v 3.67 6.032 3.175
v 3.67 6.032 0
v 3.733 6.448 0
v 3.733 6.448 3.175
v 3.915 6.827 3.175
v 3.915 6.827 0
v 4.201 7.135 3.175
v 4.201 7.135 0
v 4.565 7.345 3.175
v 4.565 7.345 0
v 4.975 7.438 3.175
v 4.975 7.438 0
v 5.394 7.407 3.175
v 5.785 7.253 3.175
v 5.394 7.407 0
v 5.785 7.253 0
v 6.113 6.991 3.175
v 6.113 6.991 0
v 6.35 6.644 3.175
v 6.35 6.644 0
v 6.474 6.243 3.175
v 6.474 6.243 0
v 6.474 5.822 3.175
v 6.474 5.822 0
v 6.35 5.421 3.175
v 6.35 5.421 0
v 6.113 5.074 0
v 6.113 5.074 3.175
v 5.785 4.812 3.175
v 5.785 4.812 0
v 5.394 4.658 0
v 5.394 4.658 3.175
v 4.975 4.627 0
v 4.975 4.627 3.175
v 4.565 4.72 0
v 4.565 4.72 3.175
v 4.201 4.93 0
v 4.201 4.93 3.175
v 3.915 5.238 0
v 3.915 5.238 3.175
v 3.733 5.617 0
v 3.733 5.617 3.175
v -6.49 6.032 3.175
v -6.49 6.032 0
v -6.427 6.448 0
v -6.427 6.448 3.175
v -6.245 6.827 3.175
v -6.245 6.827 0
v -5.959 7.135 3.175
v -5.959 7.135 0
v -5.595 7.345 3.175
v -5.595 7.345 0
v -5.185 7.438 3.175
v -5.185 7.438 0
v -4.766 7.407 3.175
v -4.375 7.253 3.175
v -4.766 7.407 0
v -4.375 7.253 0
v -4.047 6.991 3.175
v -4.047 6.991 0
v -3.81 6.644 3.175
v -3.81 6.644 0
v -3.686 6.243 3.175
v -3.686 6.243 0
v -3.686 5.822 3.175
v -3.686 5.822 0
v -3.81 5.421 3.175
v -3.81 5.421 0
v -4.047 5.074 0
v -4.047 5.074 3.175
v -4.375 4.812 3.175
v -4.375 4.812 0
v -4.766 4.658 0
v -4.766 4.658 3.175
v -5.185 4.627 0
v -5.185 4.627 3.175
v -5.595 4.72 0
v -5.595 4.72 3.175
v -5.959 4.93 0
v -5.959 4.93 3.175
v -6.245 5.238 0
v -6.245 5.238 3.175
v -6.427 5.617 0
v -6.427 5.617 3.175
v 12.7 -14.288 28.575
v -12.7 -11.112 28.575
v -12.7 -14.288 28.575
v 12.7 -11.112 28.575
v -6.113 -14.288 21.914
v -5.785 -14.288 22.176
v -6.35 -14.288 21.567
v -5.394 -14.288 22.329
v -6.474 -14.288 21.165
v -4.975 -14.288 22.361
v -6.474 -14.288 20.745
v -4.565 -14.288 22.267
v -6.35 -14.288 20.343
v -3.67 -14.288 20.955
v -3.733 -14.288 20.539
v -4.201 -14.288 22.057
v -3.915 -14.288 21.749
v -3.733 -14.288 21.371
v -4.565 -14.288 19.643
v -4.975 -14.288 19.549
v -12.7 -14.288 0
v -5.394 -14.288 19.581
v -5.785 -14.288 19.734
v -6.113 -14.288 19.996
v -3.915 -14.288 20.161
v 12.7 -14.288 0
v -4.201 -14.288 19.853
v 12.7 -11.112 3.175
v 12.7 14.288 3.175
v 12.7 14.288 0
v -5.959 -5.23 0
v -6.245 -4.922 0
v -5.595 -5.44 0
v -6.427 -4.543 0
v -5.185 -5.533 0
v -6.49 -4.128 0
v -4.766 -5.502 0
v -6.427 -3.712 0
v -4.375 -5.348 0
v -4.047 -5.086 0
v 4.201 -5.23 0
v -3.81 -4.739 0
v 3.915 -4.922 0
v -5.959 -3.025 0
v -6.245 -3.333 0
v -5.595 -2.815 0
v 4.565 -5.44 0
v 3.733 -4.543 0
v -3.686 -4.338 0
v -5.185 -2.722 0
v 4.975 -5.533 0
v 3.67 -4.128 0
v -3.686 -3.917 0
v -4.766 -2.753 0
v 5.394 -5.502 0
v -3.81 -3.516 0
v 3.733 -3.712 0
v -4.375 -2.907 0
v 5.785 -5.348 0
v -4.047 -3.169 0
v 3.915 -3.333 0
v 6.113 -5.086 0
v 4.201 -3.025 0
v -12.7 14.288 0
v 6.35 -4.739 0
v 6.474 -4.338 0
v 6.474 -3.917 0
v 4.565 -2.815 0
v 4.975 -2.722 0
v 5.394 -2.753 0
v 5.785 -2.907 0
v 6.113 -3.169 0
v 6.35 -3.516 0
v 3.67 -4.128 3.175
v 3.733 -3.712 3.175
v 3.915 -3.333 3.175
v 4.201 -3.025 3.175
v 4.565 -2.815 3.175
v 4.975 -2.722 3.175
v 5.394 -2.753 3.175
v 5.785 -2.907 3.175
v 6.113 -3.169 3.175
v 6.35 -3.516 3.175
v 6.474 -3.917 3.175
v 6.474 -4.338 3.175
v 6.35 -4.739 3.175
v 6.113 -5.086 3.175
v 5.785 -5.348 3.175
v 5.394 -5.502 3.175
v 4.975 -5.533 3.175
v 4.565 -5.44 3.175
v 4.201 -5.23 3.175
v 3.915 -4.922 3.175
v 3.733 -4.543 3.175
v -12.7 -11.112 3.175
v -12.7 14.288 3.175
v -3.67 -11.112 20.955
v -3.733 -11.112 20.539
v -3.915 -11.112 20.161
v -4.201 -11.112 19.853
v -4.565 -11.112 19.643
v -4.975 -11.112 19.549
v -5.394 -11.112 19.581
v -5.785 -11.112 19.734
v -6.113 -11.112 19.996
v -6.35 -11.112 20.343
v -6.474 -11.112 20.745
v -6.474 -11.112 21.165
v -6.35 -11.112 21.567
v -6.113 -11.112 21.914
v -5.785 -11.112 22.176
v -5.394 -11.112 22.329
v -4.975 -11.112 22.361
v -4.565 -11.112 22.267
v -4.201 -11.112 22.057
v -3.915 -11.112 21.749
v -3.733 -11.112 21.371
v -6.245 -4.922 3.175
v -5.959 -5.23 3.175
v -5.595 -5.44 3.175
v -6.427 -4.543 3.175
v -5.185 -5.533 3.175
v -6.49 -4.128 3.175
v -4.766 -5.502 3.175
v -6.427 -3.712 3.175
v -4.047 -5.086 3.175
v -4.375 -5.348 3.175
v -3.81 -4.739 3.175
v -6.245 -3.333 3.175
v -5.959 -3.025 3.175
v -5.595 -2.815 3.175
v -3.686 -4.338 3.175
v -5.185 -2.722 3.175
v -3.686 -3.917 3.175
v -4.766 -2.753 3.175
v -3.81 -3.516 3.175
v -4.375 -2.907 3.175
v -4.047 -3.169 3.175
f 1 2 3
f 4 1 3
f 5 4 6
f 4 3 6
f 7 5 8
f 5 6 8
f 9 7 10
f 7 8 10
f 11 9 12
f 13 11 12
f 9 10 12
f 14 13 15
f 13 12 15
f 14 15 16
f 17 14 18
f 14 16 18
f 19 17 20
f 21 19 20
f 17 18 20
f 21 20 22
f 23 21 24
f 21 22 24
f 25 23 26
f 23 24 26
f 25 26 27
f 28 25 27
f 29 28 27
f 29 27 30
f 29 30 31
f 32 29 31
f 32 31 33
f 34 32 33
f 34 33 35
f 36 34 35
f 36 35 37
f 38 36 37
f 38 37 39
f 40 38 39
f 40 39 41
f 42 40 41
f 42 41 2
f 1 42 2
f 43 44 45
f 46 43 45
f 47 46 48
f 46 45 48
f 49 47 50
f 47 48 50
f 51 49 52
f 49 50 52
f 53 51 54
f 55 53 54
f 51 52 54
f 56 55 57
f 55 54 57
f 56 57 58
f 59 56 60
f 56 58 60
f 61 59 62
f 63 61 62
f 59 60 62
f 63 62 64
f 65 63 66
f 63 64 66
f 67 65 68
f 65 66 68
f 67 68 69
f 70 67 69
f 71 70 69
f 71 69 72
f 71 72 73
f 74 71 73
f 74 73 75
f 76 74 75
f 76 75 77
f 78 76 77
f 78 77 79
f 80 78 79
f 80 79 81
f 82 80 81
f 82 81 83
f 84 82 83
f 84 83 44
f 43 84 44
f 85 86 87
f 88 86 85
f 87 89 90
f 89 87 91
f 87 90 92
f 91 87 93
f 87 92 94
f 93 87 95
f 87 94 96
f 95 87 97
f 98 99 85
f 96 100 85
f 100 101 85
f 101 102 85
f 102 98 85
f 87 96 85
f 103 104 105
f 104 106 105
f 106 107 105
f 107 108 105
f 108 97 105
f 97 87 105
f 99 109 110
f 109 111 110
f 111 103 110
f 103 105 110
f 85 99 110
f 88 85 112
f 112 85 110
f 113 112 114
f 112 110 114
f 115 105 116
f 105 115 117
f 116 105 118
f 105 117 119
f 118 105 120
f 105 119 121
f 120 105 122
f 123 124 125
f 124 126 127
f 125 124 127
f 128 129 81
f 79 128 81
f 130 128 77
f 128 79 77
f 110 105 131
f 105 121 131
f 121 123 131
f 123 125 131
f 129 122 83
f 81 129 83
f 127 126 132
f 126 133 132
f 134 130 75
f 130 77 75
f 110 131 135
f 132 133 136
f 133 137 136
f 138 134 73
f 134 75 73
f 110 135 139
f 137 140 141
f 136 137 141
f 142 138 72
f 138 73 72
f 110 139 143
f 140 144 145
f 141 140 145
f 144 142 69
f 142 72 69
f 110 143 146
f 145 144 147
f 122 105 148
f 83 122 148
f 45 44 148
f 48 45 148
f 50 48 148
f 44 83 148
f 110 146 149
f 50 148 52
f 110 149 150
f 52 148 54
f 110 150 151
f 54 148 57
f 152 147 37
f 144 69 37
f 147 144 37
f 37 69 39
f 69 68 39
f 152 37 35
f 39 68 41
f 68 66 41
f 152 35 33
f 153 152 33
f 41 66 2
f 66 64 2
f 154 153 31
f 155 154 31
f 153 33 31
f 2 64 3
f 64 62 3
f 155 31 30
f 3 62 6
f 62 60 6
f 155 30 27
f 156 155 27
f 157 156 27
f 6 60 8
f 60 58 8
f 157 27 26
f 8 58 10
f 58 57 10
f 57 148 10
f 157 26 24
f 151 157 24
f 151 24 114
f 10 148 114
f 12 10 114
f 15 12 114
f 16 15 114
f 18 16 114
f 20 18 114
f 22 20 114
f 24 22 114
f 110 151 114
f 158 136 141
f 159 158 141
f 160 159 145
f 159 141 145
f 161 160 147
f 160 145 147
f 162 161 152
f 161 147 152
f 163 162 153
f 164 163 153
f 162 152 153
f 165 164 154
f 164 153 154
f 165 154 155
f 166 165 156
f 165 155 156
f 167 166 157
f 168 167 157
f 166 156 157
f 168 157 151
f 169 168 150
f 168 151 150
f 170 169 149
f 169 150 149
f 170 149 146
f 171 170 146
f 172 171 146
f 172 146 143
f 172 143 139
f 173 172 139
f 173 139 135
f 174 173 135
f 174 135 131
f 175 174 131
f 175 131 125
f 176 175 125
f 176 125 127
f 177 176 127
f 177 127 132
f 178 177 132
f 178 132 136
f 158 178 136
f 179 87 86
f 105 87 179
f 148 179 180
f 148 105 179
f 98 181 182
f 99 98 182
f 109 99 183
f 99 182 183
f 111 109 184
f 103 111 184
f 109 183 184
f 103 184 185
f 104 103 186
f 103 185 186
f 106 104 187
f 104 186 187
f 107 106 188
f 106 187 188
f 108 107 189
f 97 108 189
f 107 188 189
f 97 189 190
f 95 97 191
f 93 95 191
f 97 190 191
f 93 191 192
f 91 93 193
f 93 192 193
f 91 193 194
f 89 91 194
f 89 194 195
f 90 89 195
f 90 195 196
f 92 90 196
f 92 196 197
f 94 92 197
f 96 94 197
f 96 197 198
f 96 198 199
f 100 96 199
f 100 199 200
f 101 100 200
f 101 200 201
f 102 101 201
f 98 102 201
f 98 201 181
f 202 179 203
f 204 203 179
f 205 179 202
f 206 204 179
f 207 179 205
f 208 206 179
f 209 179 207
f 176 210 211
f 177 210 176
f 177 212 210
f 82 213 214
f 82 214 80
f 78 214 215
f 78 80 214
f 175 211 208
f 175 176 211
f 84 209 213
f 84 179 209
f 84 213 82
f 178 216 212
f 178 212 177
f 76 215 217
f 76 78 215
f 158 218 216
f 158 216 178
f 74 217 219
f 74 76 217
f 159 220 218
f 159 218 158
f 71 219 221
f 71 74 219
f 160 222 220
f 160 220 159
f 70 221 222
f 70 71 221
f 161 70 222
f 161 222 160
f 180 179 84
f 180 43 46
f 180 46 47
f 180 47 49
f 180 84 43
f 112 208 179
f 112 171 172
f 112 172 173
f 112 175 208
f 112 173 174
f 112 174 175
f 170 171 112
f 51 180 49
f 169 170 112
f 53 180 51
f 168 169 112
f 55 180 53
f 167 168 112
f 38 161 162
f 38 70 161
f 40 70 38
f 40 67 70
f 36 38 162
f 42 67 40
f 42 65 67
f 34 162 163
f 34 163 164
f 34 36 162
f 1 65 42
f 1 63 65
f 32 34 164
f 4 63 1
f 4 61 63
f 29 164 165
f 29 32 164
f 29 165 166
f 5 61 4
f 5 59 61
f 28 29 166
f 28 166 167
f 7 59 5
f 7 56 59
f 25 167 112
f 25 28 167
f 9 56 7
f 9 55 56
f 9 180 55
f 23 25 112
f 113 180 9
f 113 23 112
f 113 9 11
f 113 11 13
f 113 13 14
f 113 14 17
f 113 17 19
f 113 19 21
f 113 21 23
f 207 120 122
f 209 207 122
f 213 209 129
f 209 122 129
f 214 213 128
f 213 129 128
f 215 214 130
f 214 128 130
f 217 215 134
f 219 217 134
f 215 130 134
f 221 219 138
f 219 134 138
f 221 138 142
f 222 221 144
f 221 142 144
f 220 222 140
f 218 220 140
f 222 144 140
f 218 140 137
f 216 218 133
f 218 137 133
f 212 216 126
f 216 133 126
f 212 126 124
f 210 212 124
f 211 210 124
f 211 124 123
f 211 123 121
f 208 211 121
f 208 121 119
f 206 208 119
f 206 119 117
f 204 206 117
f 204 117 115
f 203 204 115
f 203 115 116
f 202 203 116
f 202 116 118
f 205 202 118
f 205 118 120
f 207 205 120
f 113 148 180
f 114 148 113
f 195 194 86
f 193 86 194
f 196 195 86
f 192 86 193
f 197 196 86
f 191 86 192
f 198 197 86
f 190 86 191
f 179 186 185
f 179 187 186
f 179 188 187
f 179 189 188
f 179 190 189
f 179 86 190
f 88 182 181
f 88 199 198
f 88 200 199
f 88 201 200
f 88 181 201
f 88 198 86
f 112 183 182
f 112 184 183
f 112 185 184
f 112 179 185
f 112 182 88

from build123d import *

# Parameters (mm, degrees)
SKETCH1_W            = 25.4
SKETCH1_H            = 28.575
BOSS_EXTRUDE1_DEPTH  = 3.175
SKETCH2_W            = 25.4
SKETCH2_H            = 3.175
BOSS_EXTRUDE2_DEPTH  = 25.4
SKETCH4_R            = 1.4097
CUT_EXTRUDE1_DEPTH   = 29.575
LPATTERN1_COUNT      = 2
LPATTERN1_PITCH      = 10.16
LPATTERN1_COUNT_DIR2 = 2
LPATTERN1_PITCH_DIR2 = 10.16
SKETCH5_R            = 1.4097
CUT_EXTRUDE2_DEPTH   = 4.175


with BuildPart() as part:
    # Sketch1 → Boss-Extrude1 (new body)
    with BuildSketch(Plane.XY):
        Rectangle(SKETCH1_W, SKETCH1_H)
    extrude(amount=BOSS_EXTRUDE1_DEPTH)

    # Sketch2 → Boss-Extrude2 (add)
    with BuildSketch(Plane.XY.offset(3.175)):
        with Locations((0, -12.7)):
            Rectangle(SKETCH2_W, SKETCH2_H)
    extrude(amount=BOSS_EXTRUDE2_DEPTH)

    # Sketch4 → Cut-Extrude1 (cut, through all)
    with BuildSketch(Plane(origin=(0, 0, 0), x_dir=(-1, 0, 0), z_dir=(0, 0, -1))):
        with Locations((-5.08, 6.0325)):
            Circle(SKETCH4_R)
    cut_extrude1 = extrude(amount=-CUT_EXTRUDE1_DEPTH, mode=Mode.SUBTRACT)

    # LPattern1: Cut-Extrude1 2 × 2
    with Locations(*[(-j * LPATTERN1_PITCH_DIR2, -i * LPATTERN1_PITCH, 0) for i in range(LPATTERN1_COUNT) for j in range(LPATTERN1_COUNT_DIR2) if (i, j) != (0, 0)]):
        add(cut_extrude1, mode=Mode.SUBTRACT)

    # Sketch5 → Cut-Extrude2 (cut, through all)
    with BuildSketch(Plane(origin=(0, -11.1125, 0), x_dir=(1, 0, 0), z_dir=(0, 1, 0))):
        with Locations((-5.08, -20.955)):
            Circle(SKETCH5_R)
    extrude(amount=-CUT_EXTRUDE2_DEPTH, mode=Mode.SUBTRACT)


solid = part.part
